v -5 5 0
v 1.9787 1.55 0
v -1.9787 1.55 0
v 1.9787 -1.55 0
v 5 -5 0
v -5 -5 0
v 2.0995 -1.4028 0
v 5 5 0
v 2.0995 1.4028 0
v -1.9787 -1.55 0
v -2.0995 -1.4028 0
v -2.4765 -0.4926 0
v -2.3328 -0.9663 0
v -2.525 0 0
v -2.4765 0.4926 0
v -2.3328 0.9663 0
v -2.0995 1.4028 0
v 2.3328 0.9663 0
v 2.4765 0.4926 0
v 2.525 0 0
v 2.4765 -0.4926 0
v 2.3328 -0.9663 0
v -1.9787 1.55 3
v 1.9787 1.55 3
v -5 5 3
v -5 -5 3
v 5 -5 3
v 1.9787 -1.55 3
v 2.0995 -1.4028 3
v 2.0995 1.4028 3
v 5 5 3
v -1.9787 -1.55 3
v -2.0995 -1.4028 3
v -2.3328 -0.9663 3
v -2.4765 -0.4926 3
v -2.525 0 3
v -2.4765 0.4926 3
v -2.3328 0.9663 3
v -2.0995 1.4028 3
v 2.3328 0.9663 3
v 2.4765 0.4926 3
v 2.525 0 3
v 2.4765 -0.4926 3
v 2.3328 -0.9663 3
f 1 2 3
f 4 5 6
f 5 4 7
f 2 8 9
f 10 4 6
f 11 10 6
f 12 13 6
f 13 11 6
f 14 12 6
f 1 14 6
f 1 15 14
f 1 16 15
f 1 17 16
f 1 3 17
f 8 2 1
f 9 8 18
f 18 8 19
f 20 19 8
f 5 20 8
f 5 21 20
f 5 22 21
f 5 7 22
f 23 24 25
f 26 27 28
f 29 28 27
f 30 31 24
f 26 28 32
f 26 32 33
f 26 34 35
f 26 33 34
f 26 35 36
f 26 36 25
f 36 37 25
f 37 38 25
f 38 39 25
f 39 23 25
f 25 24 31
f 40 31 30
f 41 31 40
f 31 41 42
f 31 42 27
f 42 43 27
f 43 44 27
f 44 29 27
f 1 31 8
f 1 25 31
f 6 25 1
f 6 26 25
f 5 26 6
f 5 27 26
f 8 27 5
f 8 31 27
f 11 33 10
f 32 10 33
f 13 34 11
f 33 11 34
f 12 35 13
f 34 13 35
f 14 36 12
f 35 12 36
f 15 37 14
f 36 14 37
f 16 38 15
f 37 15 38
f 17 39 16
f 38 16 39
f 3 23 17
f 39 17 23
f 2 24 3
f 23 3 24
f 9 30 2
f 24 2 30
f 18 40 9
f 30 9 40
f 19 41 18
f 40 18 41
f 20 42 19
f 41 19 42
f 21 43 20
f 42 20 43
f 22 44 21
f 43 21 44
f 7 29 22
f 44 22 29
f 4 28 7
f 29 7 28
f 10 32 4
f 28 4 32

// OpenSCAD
module hole(tolerance=0.1) {
    difference() {
        circle(d=5+tolerance/2, $fn=32);
          
        translate([-2.5,1.5+tolerance/2])
        square([5,5]);
 
        scale([1,-1])
        translate([-2.5,1.5+tolerance/2])
        square([5,5]);
    }
}


linear_extrude(height=3)
difference() {
    translate([-5,-5])
    square([10,10]);
    
    hole();
}
